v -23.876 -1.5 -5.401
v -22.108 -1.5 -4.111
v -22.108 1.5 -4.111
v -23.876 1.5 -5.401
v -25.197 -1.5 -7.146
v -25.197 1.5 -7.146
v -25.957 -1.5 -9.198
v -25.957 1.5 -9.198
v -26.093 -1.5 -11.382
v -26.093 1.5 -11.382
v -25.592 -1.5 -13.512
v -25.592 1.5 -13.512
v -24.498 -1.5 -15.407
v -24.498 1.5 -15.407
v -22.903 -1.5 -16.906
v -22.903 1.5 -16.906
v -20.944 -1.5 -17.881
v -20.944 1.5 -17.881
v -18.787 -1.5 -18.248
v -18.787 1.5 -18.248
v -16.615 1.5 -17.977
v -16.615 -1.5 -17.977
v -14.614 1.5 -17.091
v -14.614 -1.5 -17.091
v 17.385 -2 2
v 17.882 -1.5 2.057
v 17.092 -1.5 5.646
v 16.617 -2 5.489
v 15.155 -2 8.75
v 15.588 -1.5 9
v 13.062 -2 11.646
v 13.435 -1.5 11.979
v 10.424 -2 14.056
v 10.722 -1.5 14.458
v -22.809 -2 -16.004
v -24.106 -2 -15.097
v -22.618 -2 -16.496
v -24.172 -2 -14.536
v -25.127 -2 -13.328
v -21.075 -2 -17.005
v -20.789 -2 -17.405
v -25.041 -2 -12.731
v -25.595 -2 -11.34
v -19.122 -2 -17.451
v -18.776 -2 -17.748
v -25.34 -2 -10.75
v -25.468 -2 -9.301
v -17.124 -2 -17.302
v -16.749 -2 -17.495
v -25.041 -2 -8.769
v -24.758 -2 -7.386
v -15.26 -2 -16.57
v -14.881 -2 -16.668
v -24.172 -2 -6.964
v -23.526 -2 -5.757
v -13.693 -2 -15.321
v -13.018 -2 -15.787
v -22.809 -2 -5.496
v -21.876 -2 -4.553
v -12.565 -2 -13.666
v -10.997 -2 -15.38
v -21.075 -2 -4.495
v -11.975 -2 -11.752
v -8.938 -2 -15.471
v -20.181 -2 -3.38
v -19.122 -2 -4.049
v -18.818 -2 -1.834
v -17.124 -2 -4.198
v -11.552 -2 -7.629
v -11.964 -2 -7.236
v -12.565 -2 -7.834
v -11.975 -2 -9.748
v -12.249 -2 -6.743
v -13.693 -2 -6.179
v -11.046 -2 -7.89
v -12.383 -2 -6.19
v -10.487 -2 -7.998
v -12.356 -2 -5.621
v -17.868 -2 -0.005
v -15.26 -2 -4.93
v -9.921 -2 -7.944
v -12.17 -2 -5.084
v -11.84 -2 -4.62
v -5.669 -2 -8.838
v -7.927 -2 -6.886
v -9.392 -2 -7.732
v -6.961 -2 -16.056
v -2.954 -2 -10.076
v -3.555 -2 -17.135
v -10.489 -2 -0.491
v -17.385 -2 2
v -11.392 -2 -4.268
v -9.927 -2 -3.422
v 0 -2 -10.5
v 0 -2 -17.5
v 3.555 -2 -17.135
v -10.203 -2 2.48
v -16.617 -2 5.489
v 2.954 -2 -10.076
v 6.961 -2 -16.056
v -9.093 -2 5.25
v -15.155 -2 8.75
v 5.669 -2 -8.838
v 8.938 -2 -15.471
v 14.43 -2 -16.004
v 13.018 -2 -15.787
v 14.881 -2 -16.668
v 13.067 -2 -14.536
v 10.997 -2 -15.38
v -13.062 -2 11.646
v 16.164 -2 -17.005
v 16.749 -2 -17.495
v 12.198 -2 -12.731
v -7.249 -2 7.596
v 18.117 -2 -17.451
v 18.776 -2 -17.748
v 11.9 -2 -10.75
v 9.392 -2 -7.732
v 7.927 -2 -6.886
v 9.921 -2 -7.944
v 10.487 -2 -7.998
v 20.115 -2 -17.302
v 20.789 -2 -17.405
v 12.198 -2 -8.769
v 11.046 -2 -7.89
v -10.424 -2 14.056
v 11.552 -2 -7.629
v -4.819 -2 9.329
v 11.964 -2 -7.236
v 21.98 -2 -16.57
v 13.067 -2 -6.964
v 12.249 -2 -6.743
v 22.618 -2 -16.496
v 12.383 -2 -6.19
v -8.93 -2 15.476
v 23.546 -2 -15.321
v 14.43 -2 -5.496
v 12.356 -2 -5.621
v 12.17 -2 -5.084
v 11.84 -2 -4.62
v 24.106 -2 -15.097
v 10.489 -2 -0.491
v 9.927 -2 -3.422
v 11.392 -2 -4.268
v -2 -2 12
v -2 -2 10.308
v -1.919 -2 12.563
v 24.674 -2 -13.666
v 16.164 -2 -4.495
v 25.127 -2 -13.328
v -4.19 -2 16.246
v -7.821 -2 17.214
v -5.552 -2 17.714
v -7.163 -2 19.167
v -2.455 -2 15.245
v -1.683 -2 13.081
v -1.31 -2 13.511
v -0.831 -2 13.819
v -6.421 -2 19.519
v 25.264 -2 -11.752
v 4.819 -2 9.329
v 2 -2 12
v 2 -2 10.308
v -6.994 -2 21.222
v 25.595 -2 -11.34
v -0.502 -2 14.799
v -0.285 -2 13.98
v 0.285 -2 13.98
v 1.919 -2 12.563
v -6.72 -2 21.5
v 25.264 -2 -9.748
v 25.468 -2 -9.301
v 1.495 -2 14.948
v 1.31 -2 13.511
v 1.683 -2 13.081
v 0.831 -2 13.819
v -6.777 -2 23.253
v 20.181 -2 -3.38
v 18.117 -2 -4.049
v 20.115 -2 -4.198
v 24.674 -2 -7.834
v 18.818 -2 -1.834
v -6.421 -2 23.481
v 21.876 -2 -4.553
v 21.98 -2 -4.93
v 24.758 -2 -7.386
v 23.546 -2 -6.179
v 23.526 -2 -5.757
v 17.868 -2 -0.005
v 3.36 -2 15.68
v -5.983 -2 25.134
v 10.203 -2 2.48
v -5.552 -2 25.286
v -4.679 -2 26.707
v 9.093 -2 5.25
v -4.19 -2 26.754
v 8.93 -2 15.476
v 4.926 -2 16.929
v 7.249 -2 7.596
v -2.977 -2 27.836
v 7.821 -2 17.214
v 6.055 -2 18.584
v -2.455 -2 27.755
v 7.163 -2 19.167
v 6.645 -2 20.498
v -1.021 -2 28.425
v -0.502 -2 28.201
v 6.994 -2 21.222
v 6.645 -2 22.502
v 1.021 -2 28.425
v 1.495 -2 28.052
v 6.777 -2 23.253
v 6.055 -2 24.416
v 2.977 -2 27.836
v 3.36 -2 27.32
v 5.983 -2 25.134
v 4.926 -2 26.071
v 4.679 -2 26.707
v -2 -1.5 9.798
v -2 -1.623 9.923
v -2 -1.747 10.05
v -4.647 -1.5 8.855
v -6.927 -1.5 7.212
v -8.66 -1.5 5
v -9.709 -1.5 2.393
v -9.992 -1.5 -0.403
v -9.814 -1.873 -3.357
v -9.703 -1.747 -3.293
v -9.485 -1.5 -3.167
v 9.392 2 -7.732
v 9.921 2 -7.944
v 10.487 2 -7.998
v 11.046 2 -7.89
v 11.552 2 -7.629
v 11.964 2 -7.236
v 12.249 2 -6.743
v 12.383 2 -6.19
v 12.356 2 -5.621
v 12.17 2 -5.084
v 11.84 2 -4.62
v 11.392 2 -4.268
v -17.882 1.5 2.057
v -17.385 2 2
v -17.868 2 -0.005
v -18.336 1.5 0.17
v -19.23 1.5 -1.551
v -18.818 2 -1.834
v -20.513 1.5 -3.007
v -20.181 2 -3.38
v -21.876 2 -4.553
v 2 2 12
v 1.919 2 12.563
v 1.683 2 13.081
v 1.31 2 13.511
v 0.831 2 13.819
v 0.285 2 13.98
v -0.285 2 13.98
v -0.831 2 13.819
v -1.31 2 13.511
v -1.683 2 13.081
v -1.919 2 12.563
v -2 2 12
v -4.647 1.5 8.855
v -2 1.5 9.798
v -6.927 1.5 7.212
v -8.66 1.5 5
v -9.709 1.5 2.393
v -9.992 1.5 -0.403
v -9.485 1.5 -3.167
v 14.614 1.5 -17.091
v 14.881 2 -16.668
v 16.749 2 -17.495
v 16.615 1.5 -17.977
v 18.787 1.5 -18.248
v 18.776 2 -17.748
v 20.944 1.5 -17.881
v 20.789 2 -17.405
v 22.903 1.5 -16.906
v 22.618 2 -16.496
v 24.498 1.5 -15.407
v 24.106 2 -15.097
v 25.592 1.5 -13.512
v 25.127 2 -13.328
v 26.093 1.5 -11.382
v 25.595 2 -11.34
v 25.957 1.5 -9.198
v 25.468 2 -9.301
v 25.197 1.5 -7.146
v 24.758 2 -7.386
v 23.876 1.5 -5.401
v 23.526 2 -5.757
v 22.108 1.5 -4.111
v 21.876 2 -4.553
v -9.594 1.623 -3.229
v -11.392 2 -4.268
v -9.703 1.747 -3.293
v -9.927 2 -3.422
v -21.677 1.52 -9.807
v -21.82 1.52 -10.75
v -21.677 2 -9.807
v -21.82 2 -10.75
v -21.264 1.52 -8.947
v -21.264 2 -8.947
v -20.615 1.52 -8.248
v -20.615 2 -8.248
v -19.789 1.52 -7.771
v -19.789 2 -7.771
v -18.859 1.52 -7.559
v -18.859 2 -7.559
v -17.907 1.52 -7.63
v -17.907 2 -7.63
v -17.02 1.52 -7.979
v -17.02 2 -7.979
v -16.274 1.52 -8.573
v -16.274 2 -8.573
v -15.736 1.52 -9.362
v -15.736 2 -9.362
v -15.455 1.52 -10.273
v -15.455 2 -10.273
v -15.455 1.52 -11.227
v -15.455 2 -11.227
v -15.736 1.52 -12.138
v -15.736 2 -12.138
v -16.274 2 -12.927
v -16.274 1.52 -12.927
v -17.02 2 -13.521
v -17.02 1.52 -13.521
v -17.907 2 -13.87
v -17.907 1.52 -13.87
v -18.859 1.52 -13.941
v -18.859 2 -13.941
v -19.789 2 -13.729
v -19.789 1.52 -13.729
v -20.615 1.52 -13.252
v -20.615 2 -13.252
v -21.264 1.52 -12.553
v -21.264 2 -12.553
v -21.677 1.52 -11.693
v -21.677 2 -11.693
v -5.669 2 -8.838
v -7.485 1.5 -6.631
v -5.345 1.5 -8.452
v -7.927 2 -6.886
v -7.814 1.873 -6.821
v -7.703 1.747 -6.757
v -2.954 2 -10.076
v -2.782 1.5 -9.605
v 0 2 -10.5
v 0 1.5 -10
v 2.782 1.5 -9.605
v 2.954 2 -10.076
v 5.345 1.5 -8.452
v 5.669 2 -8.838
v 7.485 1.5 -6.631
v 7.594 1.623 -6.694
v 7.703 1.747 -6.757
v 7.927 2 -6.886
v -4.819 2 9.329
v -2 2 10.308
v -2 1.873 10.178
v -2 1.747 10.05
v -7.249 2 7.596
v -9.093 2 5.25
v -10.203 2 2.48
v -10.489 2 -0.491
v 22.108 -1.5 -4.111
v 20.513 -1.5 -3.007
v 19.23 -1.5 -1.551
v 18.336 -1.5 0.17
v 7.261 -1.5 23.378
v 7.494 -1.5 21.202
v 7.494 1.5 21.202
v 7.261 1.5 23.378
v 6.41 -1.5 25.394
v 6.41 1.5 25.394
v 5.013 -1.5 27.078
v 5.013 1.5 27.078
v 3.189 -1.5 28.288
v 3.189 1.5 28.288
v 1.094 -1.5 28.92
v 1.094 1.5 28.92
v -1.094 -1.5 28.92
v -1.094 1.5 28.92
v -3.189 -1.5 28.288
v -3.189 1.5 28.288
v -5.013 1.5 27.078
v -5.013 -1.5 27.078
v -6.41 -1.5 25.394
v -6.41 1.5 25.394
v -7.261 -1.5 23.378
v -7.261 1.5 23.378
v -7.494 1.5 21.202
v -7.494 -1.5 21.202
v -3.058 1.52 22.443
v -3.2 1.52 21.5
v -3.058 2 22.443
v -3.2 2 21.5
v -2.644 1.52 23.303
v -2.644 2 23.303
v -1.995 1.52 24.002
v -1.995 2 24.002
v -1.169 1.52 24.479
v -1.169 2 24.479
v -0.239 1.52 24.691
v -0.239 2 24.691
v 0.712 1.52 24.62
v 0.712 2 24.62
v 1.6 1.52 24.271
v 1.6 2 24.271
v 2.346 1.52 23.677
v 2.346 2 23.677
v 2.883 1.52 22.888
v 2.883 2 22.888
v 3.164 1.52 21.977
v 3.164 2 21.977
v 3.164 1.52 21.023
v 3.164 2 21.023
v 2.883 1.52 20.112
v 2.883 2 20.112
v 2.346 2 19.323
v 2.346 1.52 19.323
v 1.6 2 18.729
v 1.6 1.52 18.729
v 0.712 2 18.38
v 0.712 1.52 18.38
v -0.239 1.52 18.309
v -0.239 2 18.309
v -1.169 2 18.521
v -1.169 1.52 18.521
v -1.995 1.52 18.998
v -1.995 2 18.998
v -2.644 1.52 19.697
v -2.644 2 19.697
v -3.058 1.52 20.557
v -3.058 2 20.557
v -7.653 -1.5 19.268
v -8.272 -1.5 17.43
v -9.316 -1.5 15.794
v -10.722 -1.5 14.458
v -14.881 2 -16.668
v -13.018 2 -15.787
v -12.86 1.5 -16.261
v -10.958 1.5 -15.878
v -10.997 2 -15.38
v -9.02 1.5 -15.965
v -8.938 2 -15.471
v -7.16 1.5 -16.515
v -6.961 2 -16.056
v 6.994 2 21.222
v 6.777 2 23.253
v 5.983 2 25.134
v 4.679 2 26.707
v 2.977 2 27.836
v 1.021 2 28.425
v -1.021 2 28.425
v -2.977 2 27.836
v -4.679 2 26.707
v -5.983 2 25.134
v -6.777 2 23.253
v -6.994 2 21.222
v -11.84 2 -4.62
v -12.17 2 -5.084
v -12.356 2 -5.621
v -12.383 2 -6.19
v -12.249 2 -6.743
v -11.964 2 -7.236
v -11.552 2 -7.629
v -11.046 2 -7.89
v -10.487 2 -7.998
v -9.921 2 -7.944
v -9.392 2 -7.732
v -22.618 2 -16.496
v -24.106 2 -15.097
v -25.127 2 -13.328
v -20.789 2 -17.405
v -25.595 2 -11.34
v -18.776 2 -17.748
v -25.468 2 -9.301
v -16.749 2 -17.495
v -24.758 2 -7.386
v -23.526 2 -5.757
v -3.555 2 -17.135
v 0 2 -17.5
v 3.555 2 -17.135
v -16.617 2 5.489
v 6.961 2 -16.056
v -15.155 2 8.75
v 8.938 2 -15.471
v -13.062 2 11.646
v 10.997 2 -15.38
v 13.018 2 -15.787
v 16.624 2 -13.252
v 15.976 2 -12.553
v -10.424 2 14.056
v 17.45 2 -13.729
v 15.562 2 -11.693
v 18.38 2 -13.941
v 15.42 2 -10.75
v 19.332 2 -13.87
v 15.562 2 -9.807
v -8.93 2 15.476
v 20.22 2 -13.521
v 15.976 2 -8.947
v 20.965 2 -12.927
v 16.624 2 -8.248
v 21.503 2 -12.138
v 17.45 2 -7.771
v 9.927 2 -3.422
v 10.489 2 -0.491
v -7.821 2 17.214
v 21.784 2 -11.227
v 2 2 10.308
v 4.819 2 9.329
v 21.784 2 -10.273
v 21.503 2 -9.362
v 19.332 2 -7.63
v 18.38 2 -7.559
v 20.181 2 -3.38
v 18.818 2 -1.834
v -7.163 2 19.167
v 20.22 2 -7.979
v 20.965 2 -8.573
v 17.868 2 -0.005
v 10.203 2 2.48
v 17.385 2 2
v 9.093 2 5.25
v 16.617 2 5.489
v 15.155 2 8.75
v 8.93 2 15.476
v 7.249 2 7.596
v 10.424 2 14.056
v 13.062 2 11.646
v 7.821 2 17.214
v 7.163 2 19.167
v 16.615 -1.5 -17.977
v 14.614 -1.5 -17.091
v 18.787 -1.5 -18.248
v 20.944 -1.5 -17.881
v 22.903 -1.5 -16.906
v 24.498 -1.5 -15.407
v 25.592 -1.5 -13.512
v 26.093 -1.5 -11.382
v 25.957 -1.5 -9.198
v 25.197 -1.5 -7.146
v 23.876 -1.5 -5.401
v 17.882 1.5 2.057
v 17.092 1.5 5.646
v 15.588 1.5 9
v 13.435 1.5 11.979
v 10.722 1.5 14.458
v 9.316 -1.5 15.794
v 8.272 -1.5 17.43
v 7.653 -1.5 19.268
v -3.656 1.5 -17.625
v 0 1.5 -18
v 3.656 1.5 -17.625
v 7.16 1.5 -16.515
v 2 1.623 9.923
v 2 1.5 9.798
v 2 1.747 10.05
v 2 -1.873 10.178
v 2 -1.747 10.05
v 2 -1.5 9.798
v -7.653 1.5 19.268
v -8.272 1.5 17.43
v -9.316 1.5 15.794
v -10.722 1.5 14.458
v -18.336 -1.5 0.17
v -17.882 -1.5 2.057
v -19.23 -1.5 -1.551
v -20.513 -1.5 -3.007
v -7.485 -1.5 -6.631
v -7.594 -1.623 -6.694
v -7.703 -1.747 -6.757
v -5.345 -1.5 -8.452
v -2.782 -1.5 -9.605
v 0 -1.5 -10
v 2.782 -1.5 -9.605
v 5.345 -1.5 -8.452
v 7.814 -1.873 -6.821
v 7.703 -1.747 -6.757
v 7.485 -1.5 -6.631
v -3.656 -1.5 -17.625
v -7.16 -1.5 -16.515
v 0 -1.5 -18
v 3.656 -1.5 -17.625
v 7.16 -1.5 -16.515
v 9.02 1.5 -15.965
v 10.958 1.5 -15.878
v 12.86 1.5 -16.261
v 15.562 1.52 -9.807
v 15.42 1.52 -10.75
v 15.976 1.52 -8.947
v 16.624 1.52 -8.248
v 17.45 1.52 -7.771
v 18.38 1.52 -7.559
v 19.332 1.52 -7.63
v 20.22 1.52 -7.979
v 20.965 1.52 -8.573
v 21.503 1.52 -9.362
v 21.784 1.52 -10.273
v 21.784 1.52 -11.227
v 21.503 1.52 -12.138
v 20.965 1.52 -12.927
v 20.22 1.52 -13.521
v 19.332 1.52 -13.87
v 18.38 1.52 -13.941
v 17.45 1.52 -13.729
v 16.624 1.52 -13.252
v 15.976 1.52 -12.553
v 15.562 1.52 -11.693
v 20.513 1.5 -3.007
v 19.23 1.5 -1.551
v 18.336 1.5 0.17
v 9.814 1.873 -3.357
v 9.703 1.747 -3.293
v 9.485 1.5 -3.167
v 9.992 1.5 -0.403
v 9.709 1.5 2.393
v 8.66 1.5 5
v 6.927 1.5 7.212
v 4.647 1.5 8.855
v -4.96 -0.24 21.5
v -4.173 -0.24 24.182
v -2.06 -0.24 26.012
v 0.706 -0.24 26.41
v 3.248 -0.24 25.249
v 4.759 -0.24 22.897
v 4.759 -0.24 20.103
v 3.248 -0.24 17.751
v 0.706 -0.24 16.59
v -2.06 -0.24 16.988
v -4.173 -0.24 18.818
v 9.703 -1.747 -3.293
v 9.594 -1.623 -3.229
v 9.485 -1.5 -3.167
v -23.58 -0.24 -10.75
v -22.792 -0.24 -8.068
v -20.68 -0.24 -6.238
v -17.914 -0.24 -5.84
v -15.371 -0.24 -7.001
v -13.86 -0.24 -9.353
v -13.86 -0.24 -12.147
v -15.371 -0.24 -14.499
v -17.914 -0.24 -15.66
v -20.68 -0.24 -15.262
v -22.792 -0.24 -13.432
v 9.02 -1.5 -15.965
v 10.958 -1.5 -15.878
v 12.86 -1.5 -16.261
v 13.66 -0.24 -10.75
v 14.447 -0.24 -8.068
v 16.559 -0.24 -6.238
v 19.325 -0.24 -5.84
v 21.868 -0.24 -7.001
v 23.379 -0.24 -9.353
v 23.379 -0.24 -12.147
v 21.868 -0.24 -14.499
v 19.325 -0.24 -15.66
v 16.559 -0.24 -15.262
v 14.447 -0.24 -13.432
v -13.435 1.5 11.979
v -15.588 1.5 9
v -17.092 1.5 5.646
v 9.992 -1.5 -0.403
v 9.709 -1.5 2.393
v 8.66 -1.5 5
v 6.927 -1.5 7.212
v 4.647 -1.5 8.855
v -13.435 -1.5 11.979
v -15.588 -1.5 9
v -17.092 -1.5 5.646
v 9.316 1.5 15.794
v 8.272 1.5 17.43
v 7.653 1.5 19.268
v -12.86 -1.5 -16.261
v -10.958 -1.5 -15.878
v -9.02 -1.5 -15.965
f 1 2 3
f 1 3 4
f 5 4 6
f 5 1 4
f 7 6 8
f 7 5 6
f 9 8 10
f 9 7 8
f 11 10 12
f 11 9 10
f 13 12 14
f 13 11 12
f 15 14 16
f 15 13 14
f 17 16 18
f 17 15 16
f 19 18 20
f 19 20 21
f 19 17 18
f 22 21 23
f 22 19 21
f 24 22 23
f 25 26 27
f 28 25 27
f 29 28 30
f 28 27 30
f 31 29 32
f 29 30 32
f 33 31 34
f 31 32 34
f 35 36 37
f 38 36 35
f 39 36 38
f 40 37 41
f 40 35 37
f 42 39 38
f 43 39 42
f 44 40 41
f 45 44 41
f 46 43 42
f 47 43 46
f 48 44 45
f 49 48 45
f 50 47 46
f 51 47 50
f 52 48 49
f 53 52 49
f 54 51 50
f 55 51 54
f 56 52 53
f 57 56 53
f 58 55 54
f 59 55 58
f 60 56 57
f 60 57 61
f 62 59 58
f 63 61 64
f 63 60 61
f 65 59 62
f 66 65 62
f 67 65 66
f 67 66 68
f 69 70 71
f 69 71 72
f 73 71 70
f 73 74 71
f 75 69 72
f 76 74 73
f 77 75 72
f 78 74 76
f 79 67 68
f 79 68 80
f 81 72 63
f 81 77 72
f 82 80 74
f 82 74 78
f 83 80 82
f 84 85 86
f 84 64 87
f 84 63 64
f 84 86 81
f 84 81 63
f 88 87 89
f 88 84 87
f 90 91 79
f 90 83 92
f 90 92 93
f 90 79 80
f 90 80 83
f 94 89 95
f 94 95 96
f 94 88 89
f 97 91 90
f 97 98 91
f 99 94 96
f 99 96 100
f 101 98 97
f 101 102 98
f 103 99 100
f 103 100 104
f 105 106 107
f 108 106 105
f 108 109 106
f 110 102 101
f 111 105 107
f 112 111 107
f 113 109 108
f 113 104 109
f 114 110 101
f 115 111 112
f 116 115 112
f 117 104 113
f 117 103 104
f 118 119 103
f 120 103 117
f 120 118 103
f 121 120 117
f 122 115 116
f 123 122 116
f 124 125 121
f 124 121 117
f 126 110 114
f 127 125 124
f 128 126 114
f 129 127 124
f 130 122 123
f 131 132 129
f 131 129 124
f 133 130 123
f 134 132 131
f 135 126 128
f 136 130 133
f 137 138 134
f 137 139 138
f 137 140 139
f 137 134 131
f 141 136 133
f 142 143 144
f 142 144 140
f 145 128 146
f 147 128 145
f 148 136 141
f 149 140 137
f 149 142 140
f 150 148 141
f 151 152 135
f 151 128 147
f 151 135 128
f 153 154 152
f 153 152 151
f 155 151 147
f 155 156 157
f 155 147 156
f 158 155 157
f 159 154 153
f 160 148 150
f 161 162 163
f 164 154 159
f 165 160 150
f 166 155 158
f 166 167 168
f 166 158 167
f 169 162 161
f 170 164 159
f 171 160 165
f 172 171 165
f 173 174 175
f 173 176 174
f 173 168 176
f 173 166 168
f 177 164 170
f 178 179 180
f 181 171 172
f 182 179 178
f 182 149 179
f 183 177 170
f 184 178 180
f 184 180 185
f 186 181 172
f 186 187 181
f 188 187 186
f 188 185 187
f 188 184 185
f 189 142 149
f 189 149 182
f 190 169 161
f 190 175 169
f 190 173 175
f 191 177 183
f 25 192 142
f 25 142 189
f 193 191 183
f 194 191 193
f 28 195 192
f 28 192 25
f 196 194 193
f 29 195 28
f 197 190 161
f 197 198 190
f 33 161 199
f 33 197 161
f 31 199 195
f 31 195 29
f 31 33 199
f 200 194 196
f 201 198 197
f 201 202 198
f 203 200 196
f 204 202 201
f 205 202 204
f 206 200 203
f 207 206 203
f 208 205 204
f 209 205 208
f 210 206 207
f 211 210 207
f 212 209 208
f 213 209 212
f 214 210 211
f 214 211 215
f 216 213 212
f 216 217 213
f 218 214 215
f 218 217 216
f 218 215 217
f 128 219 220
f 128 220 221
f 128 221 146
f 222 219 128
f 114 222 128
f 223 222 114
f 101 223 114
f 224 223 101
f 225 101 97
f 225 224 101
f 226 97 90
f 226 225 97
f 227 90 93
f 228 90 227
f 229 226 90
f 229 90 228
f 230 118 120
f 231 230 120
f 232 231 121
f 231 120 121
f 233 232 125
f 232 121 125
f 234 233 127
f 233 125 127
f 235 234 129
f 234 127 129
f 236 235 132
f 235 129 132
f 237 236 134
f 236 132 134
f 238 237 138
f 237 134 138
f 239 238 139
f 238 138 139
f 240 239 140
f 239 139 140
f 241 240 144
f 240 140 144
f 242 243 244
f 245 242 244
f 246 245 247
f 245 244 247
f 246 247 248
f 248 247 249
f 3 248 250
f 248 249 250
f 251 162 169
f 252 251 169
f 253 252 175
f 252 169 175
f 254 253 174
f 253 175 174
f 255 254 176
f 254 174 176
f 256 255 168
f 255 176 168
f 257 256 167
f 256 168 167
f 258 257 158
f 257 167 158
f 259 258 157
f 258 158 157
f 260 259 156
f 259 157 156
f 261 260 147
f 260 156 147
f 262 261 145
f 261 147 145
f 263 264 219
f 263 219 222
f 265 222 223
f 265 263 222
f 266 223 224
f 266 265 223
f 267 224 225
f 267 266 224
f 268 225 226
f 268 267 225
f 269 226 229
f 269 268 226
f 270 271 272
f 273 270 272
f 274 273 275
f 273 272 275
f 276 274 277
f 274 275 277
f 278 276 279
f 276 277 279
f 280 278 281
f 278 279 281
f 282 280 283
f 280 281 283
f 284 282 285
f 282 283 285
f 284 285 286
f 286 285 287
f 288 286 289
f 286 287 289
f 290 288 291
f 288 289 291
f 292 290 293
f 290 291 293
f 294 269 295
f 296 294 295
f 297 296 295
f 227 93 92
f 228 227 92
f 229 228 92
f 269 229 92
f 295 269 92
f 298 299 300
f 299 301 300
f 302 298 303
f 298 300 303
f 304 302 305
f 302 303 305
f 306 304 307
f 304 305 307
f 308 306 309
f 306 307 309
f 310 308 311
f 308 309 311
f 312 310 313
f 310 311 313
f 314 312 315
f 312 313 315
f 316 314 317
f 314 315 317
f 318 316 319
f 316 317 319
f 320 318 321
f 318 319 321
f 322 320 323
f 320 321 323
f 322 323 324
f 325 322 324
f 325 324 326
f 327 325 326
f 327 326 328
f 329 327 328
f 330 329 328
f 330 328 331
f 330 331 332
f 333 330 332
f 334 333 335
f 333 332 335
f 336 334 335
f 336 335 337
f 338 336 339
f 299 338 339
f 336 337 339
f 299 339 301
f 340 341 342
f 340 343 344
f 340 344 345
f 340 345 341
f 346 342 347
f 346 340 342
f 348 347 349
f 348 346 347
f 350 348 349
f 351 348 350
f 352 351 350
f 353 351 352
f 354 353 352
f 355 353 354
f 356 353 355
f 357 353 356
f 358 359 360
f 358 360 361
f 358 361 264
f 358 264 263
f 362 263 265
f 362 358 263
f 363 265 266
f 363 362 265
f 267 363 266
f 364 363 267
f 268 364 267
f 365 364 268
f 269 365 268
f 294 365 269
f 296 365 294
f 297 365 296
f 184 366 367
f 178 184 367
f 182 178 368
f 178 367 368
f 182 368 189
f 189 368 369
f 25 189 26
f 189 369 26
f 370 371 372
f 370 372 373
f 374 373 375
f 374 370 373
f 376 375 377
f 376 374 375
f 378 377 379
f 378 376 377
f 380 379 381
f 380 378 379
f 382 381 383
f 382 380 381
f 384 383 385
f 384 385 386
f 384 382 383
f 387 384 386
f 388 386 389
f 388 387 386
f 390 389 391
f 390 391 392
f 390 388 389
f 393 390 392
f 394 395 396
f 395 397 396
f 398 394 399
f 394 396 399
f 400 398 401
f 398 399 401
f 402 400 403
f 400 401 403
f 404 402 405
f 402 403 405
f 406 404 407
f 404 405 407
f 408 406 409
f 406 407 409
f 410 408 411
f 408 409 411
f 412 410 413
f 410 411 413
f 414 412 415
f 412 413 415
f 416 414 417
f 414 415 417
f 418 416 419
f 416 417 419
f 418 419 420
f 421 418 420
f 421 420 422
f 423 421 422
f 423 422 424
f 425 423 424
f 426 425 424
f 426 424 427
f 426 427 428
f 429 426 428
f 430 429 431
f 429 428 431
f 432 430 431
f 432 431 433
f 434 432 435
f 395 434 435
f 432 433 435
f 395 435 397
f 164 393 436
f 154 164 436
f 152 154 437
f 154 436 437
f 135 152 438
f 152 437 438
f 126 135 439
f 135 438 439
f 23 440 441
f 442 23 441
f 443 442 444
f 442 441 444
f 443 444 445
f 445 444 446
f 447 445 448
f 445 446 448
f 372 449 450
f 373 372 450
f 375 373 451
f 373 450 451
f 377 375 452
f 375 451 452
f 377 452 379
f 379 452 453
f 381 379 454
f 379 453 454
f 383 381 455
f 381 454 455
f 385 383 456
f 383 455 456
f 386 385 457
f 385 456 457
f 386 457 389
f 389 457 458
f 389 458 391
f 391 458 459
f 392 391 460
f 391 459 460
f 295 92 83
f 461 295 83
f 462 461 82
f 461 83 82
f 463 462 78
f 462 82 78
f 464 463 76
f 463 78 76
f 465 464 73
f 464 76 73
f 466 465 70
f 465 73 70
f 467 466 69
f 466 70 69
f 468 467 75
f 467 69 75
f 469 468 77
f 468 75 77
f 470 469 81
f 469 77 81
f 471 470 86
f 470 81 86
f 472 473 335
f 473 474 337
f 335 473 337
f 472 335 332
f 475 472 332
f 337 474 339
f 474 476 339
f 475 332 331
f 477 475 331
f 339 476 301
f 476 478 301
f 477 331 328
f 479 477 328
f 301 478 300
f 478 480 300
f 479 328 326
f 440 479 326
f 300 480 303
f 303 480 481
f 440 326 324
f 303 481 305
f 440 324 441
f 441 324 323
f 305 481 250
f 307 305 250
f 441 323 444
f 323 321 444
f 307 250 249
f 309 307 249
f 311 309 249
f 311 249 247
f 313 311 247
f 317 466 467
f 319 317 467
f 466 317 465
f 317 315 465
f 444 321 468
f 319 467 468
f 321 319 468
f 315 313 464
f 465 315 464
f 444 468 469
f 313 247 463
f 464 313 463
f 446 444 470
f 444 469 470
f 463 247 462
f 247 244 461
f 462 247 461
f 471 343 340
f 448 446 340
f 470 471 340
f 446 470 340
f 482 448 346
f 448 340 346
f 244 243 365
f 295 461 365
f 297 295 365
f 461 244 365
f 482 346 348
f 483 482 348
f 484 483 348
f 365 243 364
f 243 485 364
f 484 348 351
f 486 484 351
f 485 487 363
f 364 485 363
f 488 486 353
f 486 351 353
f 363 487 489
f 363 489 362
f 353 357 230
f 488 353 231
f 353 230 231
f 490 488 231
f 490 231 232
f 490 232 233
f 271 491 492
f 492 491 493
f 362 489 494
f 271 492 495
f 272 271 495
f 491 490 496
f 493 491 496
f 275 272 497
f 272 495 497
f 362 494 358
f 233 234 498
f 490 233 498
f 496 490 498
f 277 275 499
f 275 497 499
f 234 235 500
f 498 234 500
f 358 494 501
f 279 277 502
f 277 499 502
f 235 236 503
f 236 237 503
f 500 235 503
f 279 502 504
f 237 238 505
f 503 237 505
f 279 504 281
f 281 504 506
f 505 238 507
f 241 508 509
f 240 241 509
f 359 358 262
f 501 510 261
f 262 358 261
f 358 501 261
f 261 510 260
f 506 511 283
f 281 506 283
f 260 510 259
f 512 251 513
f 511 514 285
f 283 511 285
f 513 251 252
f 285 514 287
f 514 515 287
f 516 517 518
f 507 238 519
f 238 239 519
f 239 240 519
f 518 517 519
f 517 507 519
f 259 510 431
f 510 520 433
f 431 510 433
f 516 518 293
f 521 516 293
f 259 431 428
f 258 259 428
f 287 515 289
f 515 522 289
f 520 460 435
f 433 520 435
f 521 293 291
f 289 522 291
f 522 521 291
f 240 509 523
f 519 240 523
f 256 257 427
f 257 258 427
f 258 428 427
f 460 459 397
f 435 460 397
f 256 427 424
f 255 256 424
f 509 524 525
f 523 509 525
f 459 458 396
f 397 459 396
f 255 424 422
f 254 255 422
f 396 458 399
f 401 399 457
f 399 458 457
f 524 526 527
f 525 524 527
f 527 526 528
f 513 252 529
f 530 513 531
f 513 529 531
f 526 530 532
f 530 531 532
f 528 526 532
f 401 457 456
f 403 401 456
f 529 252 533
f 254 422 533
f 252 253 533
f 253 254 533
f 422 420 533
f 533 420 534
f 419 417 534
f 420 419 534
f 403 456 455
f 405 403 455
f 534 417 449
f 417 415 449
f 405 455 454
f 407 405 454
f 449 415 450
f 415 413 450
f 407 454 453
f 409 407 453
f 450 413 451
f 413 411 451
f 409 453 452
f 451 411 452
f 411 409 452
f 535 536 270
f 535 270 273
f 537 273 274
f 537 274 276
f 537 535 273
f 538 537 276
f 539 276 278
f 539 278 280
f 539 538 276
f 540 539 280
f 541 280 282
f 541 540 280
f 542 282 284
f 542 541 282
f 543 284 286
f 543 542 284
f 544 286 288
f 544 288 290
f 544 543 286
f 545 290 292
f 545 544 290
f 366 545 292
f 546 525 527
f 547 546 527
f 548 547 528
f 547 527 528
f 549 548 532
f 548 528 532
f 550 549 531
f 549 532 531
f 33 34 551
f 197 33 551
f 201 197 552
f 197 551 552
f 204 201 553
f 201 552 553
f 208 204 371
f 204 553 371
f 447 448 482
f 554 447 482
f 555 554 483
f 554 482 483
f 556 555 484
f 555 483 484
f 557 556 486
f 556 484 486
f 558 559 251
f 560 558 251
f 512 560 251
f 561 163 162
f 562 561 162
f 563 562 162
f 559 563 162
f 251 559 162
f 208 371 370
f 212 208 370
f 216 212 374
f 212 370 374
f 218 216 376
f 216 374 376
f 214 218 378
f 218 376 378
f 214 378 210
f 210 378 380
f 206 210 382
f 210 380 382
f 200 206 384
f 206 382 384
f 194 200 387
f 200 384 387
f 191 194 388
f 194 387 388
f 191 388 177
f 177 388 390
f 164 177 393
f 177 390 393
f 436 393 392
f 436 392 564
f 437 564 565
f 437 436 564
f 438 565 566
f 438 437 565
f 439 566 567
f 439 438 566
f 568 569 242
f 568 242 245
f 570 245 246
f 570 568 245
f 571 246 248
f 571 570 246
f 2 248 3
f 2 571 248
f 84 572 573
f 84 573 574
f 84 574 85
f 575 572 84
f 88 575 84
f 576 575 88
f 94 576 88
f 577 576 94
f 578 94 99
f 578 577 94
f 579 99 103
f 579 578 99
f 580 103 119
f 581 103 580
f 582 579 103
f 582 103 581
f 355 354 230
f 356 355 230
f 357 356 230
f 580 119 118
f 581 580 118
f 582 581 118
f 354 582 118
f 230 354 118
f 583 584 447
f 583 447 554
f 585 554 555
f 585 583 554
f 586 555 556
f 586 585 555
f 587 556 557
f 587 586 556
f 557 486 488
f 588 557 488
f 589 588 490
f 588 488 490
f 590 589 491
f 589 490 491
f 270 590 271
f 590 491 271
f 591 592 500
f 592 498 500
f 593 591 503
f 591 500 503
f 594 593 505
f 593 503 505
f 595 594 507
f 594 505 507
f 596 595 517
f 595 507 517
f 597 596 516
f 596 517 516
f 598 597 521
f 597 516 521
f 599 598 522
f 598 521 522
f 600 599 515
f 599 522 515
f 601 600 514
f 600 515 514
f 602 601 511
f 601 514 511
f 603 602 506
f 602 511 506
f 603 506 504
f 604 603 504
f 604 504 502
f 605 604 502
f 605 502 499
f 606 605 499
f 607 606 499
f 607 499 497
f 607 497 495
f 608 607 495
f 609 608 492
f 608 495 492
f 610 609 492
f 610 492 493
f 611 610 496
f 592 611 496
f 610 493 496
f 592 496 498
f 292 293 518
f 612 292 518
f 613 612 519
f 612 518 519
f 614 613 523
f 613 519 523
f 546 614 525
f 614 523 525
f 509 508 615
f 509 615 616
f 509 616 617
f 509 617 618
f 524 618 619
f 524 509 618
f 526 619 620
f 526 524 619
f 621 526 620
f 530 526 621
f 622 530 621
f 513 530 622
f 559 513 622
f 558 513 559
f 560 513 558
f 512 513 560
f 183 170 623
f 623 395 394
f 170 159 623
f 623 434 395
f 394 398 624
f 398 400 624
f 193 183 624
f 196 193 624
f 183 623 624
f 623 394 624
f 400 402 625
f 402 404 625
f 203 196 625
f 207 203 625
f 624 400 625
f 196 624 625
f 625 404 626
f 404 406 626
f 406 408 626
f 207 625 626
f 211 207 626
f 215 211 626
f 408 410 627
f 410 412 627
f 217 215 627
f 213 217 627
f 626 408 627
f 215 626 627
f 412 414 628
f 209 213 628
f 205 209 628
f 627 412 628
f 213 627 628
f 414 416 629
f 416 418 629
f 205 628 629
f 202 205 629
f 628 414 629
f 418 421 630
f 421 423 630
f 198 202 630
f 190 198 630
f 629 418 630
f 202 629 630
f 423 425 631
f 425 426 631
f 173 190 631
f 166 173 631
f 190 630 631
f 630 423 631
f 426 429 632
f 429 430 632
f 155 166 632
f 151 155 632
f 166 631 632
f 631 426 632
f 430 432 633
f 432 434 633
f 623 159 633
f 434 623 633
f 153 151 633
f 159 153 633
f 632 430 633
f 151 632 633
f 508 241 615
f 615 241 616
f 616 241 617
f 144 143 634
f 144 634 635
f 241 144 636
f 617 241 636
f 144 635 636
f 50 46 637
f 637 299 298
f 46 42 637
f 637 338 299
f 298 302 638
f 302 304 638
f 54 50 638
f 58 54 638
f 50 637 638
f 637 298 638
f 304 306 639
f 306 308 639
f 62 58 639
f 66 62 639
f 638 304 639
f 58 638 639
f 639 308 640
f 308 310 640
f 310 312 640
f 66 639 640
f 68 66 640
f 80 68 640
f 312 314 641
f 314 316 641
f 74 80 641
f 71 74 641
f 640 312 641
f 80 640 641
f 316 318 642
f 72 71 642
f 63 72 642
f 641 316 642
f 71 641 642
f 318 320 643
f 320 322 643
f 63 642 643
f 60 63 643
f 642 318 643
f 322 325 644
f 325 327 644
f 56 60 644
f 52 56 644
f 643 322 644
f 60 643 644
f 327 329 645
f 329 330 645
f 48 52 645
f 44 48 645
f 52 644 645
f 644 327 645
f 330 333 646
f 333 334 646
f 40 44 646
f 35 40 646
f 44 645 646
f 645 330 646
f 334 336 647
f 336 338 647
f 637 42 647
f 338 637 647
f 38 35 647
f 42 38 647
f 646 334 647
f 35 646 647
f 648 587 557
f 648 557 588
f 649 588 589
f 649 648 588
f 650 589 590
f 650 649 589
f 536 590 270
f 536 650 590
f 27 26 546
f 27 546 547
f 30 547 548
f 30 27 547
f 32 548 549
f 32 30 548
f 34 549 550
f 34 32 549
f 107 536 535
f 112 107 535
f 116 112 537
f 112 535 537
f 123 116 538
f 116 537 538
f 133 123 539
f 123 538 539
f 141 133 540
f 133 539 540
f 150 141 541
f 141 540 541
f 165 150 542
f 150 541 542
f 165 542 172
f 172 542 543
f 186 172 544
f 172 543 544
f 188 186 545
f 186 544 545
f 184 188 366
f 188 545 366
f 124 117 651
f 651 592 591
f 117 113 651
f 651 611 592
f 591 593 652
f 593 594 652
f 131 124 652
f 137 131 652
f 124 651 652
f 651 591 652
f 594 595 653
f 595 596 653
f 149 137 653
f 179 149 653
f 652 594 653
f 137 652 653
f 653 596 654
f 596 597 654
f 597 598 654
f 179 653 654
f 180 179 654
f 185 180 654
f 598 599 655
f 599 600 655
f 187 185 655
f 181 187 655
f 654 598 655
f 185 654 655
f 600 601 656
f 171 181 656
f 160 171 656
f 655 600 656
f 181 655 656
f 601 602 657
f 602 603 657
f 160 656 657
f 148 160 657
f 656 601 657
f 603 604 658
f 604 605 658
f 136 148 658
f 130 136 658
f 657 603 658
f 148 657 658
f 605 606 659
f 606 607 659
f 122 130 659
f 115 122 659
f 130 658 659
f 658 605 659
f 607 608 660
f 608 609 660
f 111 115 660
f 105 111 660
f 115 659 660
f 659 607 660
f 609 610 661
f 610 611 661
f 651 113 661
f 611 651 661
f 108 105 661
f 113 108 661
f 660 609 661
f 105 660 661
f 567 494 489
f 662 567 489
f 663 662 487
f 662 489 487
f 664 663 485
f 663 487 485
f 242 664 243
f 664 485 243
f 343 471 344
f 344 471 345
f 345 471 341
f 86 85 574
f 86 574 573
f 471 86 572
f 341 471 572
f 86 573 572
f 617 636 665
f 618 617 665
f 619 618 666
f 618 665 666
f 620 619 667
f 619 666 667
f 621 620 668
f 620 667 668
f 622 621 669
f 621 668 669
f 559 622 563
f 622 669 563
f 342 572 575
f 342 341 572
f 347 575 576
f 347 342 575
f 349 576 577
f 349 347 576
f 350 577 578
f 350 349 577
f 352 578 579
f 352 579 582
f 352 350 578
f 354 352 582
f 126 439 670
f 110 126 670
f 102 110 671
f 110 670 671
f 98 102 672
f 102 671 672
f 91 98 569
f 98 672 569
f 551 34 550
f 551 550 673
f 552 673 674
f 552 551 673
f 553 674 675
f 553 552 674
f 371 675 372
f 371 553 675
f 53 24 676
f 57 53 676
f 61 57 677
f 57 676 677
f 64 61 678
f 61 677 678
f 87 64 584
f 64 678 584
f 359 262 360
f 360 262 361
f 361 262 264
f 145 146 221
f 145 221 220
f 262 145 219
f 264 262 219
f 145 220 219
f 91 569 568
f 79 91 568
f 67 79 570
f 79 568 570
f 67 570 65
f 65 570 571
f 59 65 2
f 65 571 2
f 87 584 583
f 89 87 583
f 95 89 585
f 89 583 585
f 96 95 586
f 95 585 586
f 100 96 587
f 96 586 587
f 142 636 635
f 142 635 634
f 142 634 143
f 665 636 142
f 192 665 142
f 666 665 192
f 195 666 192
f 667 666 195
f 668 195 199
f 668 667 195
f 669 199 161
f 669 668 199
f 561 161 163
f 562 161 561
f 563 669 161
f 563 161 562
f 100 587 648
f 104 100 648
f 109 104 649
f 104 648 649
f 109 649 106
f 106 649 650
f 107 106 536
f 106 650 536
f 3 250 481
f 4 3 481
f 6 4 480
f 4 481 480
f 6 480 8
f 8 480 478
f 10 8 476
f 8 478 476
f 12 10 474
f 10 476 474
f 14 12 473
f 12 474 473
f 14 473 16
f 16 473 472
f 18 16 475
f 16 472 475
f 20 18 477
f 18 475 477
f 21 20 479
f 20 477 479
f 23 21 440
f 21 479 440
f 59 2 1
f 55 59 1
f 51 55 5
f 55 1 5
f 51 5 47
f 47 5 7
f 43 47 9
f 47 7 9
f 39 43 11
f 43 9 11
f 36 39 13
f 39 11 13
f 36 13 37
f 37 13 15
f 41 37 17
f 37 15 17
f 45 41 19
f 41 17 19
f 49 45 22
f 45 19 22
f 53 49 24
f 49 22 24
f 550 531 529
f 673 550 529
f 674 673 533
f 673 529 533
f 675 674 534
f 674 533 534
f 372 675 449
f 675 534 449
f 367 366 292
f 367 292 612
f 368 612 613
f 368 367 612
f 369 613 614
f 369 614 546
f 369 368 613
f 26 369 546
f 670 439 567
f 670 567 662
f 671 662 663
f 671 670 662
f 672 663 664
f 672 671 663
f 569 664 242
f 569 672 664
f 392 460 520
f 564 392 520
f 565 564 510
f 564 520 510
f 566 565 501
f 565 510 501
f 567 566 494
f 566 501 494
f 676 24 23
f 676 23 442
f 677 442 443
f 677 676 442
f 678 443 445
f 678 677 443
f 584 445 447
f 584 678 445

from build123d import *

# Parameters (mm, degrees)
F0_R           = 10
F1_DEPTH       = 2
F1_DEPTH_BACK  = 2
F2_SIZE        = 0.5
F4_D           = 6.4
F4_CSINK_D     = 13.44
F4_CSINK_ANGLE = 90
F6_DEPTH       = 4.001


# Not quite as in the source:
# - a feature names something its author has since deleted; it is built from what else it names


with BuildPart() as f1:
    # F0 (on Front) → F1 (new body, two sides)
    with BuildSketch(Plane.XZ) as f1_sk:
        with BuildLine():
            ThreePointArc((10.7222839925, 14.457960644), (8.271877925, 17.429551948), (7.4940694571, 21.2018004501))
            ThreePointArc((7.4940694571, 21.2018004501), (0, 29), (-7.4940694571, 21.2018004501))
            ThreePointArc((-7.4940694571, 21.2018004501), (-8.271877925, 17.429551948), (-10.7222839925, 14.457960644))
            ThreePointArc((-10.7222839925, 14.457960644), (-15.5884572681, 9), (-17.8821032009, 2.0567900021))
            ThreePointArc((-17.8821032009, 2.0567900021), (-19.2303737261, -1.551119554), (-22.1083325243, -4.1108456974))
            ThreePointArc((-22.1083325243, -4.1108456974), (-25.1147367097, -14.5), (-14.6142630672, -17.0909547527))
            ThreePointArc((-14.6142630672, -17.0909547527), (-10.9584958011, -15.8784323941), (-7.1598192084, -16.5147506461))
            ThreePointArc((-7.1598192084, -16.5147506461), (0, -18), (7.1598192084, -16.5147506461))
            ThreePointArc((7.1598192084, -16.5147506461), (10.9584958011, -15.8784323941), (14.6142630672, -17.0909547527))
            ThreePointArc((14.6142630672, -17.0909547527), (25.1147367097, -14.5), (22.1083325243, -4.1108456974))
            ThreePointArc((22.1083325243, -4.1108456974), (19.2303737261, -1.551119554), (17.8821032009, 2.0567900021))
            ThreePointArc((17.8821032009, 2.0567900021), (15.5884572681, 9), (10.7222839925, 14.457960644))
        make_face()
        Circle(F0_R, mode=Mode.SUBTRACT)
    extrude(amount=F1_DEPTH)
    extrude(f1_sk.sketch, amount=-F1_DEPTH_BACK)

    # F2
    f2_edges = [f1.edges().sort_by_distance(p)[0] for p in [
        (0, -2, 29),
        (0, 2, 29),
        (-10, -2, 0),
        (-10, 2, 0),
    ]]
    chamfer(f2_edges, length=F2_SIZE)

    # F4 (through all)
    with Locations(Plane.XZ.offset(2)):
        with Locations((0, 21.5), (-18.6195461814, -10.75), (18.6195461814, -10.75)):
            CounterSinkHole(F4_D / 2, F4_CSINK_D / 2, counter_sink_angle=F4_CSINK_ANGLE)

    # F5 (on face) → F6 (cut, through all)
    with BuildSketch(Plane.XZ.offset(2)):
        with BuildLine():
            ThreePointArc((-2, 9.7979589711), (0, 10), (2, 9.7979589711))
            Line((2, 9.7979589711), (2, 12))
            ThreePointArc((2, 12), (0, 14), (-2, 12))
            Line((-2, 12), (-2, 9.7979589711))
        make_face()
        with BuildLine():
            Line((-9.3923048454, -7.7320508076), (-7.4852813742, -6.6310302931))
            ThreePointArc((-7.4852813742, -6.6310302931), (-8.6602540378, -5), (-9.4852813742, -3.166928678))
            Line((-9.4852813742, -3.166928678), (-11.3923048454, -4.2679491924))
            ThreePointArc((-11.3923048454, -4.2679491924), (-12.124355653, -7), (-9.3923048454, -7.7320508076))
        make_face()
        with BuildLine():
            Line((11.3923048454, -4.2679491924), (9.4852813742, -3.166928678))
            ThreePointArc((9.4852813742, -3.166928678), (8.6602540378, -5), (7.4852813742, -6.6310302931))
            Line((7.4852813742, -6.6310302931), (9.3923048454, -7.7320508076))
            ThreePointArc((9.3923048454, -7.7320508076), (12.124355653, -7), (11.3923048454, -4.2679491924))
        make_face()
    extrude(amount=-F6_DEPTH, mode=Mode.SUBTRACT)


solid = f1.part
